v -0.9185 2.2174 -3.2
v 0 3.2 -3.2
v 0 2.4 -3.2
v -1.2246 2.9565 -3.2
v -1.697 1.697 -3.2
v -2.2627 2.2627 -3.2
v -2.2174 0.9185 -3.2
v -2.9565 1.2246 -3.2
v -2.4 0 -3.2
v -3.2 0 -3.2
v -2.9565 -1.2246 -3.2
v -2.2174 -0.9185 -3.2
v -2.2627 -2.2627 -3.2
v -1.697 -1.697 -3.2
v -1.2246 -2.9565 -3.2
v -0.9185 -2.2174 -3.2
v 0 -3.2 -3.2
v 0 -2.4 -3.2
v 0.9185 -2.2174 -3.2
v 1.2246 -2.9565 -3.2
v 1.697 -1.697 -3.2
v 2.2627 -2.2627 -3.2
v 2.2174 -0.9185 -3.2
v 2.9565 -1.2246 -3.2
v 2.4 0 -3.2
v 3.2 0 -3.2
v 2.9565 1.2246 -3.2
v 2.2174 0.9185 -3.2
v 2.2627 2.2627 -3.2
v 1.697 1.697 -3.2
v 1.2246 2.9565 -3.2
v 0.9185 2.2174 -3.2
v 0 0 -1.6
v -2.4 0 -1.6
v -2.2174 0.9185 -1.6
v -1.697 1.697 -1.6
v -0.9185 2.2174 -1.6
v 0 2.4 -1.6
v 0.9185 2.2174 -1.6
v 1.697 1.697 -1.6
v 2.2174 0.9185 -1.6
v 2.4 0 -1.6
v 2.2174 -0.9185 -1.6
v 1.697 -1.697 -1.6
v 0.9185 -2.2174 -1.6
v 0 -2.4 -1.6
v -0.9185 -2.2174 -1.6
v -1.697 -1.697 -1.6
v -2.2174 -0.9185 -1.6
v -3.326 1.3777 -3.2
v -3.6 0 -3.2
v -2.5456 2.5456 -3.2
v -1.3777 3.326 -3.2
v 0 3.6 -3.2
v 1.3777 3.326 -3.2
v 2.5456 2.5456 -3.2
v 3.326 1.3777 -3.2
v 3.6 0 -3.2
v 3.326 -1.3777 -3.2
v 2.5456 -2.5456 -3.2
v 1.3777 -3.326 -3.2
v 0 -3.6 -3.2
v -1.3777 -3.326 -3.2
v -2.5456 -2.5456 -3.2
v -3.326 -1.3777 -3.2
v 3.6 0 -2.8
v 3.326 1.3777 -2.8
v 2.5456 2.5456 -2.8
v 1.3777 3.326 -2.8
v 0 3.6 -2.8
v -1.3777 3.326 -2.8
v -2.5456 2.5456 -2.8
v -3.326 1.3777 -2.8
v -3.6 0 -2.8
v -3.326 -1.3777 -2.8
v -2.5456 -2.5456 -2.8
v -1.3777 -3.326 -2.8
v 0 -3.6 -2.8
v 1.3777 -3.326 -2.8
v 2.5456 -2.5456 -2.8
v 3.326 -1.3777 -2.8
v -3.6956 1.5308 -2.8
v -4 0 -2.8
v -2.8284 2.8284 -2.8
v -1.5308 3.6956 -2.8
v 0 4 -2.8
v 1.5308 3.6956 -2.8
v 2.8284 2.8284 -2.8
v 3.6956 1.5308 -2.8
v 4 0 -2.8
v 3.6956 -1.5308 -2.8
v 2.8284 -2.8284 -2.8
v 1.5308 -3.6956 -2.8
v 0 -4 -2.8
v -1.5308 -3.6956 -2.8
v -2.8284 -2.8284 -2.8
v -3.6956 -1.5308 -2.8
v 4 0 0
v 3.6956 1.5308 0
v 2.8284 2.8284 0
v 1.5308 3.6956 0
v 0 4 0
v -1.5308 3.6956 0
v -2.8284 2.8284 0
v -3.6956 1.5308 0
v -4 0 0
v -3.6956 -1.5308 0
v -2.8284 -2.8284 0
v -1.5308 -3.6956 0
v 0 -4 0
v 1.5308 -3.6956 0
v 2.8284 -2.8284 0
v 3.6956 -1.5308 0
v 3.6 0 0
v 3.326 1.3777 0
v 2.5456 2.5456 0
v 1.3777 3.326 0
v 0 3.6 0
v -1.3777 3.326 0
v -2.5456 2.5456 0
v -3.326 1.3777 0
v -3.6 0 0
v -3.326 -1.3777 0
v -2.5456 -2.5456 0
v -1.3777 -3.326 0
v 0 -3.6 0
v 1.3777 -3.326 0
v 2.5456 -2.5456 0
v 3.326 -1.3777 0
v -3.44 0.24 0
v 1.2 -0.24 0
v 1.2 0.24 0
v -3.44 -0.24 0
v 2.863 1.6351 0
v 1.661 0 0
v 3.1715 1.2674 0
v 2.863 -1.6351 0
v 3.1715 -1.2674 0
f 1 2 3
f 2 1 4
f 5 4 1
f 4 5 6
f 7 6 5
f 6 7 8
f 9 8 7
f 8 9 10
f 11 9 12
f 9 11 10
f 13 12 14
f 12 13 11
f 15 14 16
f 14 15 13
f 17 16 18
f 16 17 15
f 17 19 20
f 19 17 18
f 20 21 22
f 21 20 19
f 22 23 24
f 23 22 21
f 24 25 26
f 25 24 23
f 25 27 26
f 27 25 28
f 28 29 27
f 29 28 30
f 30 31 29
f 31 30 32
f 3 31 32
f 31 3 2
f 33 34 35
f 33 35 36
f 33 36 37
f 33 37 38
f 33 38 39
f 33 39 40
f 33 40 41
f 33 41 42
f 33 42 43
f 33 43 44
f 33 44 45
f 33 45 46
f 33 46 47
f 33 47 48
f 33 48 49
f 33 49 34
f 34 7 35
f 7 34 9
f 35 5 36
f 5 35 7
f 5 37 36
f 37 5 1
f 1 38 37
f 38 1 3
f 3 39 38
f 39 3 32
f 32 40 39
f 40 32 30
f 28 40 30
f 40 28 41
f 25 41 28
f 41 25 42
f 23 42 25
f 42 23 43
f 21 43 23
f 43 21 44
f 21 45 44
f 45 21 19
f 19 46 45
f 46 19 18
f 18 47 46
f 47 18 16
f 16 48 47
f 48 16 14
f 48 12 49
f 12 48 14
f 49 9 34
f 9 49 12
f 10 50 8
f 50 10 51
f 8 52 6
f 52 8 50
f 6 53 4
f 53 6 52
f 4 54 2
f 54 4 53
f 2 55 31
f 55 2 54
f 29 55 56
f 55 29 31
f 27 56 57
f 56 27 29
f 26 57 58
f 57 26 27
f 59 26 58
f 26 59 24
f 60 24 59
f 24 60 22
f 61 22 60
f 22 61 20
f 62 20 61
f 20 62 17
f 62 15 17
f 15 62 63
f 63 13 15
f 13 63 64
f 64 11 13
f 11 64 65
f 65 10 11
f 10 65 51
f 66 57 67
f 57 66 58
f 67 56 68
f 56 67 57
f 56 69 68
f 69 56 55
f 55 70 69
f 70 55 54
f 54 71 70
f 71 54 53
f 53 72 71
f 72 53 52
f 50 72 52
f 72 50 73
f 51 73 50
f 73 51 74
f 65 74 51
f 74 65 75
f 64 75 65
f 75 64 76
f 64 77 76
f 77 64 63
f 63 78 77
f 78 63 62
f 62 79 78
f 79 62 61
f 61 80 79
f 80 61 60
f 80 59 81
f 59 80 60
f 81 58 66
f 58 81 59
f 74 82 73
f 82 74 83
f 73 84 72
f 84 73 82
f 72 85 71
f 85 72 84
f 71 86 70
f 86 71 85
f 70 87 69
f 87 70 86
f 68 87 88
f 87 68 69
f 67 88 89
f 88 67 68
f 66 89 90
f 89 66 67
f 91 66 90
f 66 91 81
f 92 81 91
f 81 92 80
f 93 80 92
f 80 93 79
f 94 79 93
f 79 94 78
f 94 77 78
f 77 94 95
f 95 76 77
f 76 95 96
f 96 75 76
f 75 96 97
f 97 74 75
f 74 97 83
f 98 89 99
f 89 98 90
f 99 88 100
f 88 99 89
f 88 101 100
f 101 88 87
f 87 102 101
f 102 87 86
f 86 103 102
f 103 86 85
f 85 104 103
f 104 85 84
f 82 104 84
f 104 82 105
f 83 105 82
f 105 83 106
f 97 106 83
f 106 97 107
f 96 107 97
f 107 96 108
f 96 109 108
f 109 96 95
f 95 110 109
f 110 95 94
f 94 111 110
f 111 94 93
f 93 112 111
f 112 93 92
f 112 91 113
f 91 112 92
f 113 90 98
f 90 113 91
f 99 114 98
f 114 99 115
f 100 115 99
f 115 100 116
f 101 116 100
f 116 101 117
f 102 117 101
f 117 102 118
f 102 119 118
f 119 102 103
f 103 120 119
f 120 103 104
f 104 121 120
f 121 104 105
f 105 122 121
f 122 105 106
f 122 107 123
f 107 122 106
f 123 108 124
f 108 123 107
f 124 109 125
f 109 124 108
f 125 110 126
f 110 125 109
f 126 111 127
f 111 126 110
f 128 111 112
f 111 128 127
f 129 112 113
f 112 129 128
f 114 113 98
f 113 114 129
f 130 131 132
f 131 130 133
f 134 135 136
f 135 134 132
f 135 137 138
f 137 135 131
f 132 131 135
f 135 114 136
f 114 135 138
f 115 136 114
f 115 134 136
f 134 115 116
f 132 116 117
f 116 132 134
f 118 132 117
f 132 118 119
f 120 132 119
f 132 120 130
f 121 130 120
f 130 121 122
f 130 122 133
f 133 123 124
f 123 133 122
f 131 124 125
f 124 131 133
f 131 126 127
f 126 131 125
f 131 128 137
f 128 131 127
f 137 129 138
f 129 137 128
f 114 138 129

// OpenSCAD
// file: ../p/4-4disc.scad
use <../lib.scad>
function ldraw_lib__4_4disc() = [
// 0 Disc 1.0
// 0 Name: 4-4disc.dat
// 0 Author: James Jessiman
// 0 !LDRAW_ORG Primitive UPDATE 2002-02
// 0 !LICENSE Licensed under CC BY 2.0 and CC BY 4.0 : see CAreadme.txt
// 
// 0 BFC CERTIFY CCW
  [0,"BFC","CERTIFY"],
  [0,"BFC","CCW"],
// 
// 0 !HISTORY 1998-12-15 [PTadmin] Official Update 1998-10
// 0 !HISTORY 2002-03-23 [sbliss] Added BFC statement
// 0 !HISTORY 2002-04-25 [PTadmin] Official Update 2002-02
// 0 !HISTORY 2007-06-24 [PTadmin] Header formatted for Contributor Agreement
// 0 !HISTORY 2008-07-01 [PTadmin] Official Update 2008-01
// 
// 
// 3 16 0 0 0 1 0 0 0.9239 0 0.3827
  [3,16,0,0,0,1,0,0,0.9239,0,0.3827],
// 3 16 0 0 0 0.9239 0 0.3827 0.7071 0 0.7071
  [3,16,0,0,0,0.9239,0,0.3827,0.7071,0,0.7071],
// 3 16 0 0 0 0.7071 0 0.7071 0.3827 0 0.9239
  [3,16,0,0,0,0.7071,0,0.7071,0.3827,0,0.9239],
// 3 16 0 0 0 0.3827 0 0.9239 0 0 1
  [3,16,0,0,0,0.3827,0,0.9239,0,0,1],
// 3 16 0 0 0 0 0 1 -0.3827 0 0.9239
  [3,16,0,0,0,0,0,1,-0.3827,0,0.9239],
// 3 16 0 0 0 -0.3827 0 0.9239 -0.7071 0 0.7071
  [3,16,0,0,0,-0.3827,0,0.9239,-0.7071,0,0.7071],
// 3 16 0 0 0 -0.7071 0 0.7071 -0.9239 0 0.3827
  [3,16,0,0,0,-0.7071,0,0.7071,-0.9239,0,0.3827],
// 3 16 0 0 0 -0.9239 0 0.3827 -1 0 -0
  [3,16,0,0,0,-0.9239,0,0.3827,-1,0,-0],
// 3 16 0 0 0 -1 0 -0 -0.9239 0 -0.3827
  [3,16,0,0,0,-1,0,-0,-0.9239,0,-0.3827],
// 3 16 0 0 0 -0.9239 0 -0.3827 -0.7071 0 -0.7071
  [3,16,0,0,0,-0.9239,0,-0.3827,-0.7071,0,-0.7071],
// 3 16 0 0 0 -0.7071 0 -0.7071 -0.3827 0 -0.9239
  [3,16,0,0,0,-0.7071,0,-0.7071,-0.3827,0,-0.9239],
// 3 16 0 0 0 -0.3827 0 -0.9239 0 0 -1
  [3,16,0,0,0,-0.3827,0,-0.9239,0,0,-1],
// 3 16 0 0 0 0 0 -1 0.3827 0 -0.9239
  [3,16,0,0,0,0,0,-1,0.3827,0,-0.9239],
// 3 16 0 0 0 0.3827 0 -0.9239 0.7071 0 -0.7071
  [3,16,0,0,0,0.3827,0,-0.9239,0.7071,0,-0.7071],
// 3 16 0 0 0 0.7071 0 -0.7071 0.9239 0 -0.3827
  [3,16,0,0,0,0.7071,0,-0.7071,0.9239,0,-0.3827],
// 3 16 0 0 0 0.9239 0 -0.3827 1 0 0
  [3,16,0,0,0,0.9239,0,-0.3827,1,0,0],
// 0
];
makepoly(ldraw_lib__4_4disc(), line=0.2);
// file: ../p/4-4ring3.scad
use <../lib.scad>
function ldraw_lib__4_4ring3() = [
// 0 Ring  3 x 1.0
// 0 Name: 4-4ring3.dat
// 0 Author: James Jessiman
// 0 !LDRAW_ORG Primitive UPDATE 2009-01
// 0 !LICENSE Licensed under CC BY 2.0 and CC BY 4.0 : see CAreadme.txt
// 
// 0 BFC CERTIFY CCW
  [0,"BFC","CERTIFY"],
  [0,"BFC","CCW"],
// 
// 0 !HISTORY 1998-12-15 [PTadmin] Official Update 1998-10
// 0 !HISTORY 2002-04-05 [hafhead] Added BFC statement
// 0 !HISTORY 2002-04-25 [PTadmin] Official Update 2002-02
// 0 !HISTORY 2007-06-24 [PTadmin] Header formatted for Contributor Agreement
// 0 !HISTORY 2008-07-01 [PTadmin] Official Update 2008-01
// 0 !HISTORY 2008-08-26 [cwdee] Switch polygon winding and rename
// 0 !HISTORY 2009-05-02 [PTadmin] Official Update 2009-01
// 
// 
// 4 16 -1.5308 0 3.6956 -1.1481 0 2.7717 0 0 3 0 0 4
  [4,16,-1.5308,0,3.6956,-1.1481,0,2.7717,0,0,3,0,0,4],
// 4 16 -2.8284 0 2.8284 -2.1213 0 2.1213 -1.1481 0 2.7717 -1.5308 0 3.6956
  [4,16,-2.8284,0,2.8284,-2.1213,0,2.1213,-1.1481,0,2.7717,-1.5308,0,3.6956],
// 4 16 -3.6956 0 1.5308 -2.7717 0 1.1481 -2.1213 0 2.1213 -2.8284 0 2.8284
  [4,16,-3.6956,0,1.5308,-2.7717,0,1.1481,-2.1213,0,2.1213,-2.8284,0,2.8284],
// 4 16 -4 0 0 -3 0 0 -2.7717 0 1.1481 -3.6956 0 1.5308
  [4,16,-4,0,0,-3,0,0,-2.7717,0,1.1481,-3.6956,0,1.5308],
// 4 16 -3.6956 0 -1.5308 -2.7717 0 -1.1481 -3 0 0 -4 0 0
  [4,16,-3.6956,0,-1.5308,-2.7717,0,-1.1481,-3,0,0,-4,0,0],
// 4 16 -2.8284 0 -2.8284 -2.1213 0 -2.1213 -2.7717 0 -1.1481 -3.6956 0 -1.5308
  [4,16,-2.8284,0,-2.8284,-2.1213,0,-2.1213,-2.7717,0,-1.1481,-3.6956,0,-1.5308],
// 4 16 -1.5308 0 -3.6956 -1.1481 0 -2.7717 -2.1213 0 -2.1213 -2.8284 0 -2.8284
  [4,16,-1.5308,0,-3.6956,-1.1481,0,-2.7717,-2.1213,0,-2.1213,-2.8284,0,-2.8284],
// 4 16 0 0 -4 0 0 -3 -1.1481 0 -2.7717 -1.5308 0 -3.6956
  [4,16,0,0,-4,0,0,-3,-1.1481,0,-2.7717,-1.5308,0,-3.6956],
// 4 16 1.5308 0 -3.6956 1.1481 0 -2.7717 0 0 -3 0 0 -4
  [4,16,1.5308,0,-3.6956,1.1481,0,-2.7717,0,0,-3,0,0,-4],
// 4 16 2.8284 0 -2.8284 2.1213 0 -2.1213 1.1481 0 -2.7717 1.5308 0 -3.6956
  [4,16,2.8284,0,-2.8284,2.1213,0,-2.1213,1.1481,0,-2.7717,1.5308,0,-3.6956],
// 4 16 3.6956 0 -1.5308 2.7717 0 -1.1481 2.1213 0 -2.1213 2.8284 0 -2.8284
  [4,16,3.6956,0,-1.5308,2.7717,0,-1.1481,2.1213,0,-2.1213,2.8284,0,-2.8284],
// 4 16 4 0 0 3 0 0 2.7717 0 -1.1481 3.6956 0 -1.5308
  [4,16,4,0,0,3,0,0,2.7717,0,-1.1481,3.6956,0,-1.5308],
// 4 16 3.6956 0 1.5308 2.7717 0 1.1481 3 0 0 4 0 0
  [4,16,3.6956,0,1.5308,2.7717,0,1.1481,3,0,0,4,0,0],
// 4 16 2.8284 0 2.8284 2.1213 0 2.1213 2.7717 0 1.1481 3.6956 0 1.5308
  [4,16,2.8284,0,2.8284,2.1213,0,2.1213,2.7717,0,1.1481,3.6956,0,1.5308],
// 4 16 1.5308 0 3.6956 1.1481 0 2.7717 2.1213 0 2.1213 2.8284 0 2.8284
  [4,16,1.5308,0,3.6956,1.1481,0,2.7717,2.1213,0,2.1213,2.8284,0,2.8284],
// 4 16 0 0 4 0 0 3 1.1481 0 2.7717 1.5308 0 3.6956
  [4,16,0,0,4,0,0,3,1.1481,0,2.7717,1.5308,0,3.6956],
// 0
];
makepoly(ldraw_lib__4_4ring3(), line=0.2);
// file: ../p/4-4cylc.scad
use <../lib.scad>
use <4-4cyli.scad>
use <4-4disc.scad>
use <4-4edge.scad>
function ldraw_lib__4_4cylc() = [
// 0 Cylinder Closed 1.0
// 0 Name: 4-4cylc.dat
// 0 Author: Alex Taylor [anathema]
// 0 !LDRAW_ORG Primitive UPDATE 2009-02
// 0 !LICENSE Licensed under CC BY 2.0 and CC BY 4.0 : see CAreadme.txt
// 
// 0 BFC CERTIFY CCW
  [0,"BFC","CERTIFY"],
  [0,"BFC","CCW"],
// 
// 0 !HISTORY 2008-12-29 [cwdee] Removed one disc
// 0 !HISTORY 2009-09-03 [PTadmin] Official Update 2009-02
// 
// 
// 1 16 0 0 0 1 0 0 0 1 0 0 0 1 4-4edge.dat
  [1,16,0,0,0,1,0,0,0,1,0,0,0,1, ldraw_lib__4_4edge()],
// 1 16 0 1 0 1 0 0 0 1 0 0 0 1 4-4edge.dat
  [1,16,0,1,0,1,0,0,0,1,0,0,0,1, ldraw_lib__4_4edge()],
// 1 16 0 0 0 1 0 0 0 1 0 0 0 1 4-4disc.dat
  [1,16,0,0,0,1,0,0,0,1,0,0,0,1, ldraw_lib__4_4disc()],
// 1 16 0 0 0 1 0 0 0 1 0 0 0 1 4-4cyli.dat
  [1,16,0,0,0,1,0,0,0,1,0,0,0,1, ldraw_lib__4_4cyli()],
// 0
];
makepoly(ldraw_lib__4_4cylc(), line=0.2);
// file: ../p/4-4edge.scad
use <../lib.scad>
function ldraw_lib__4_4edge() = [
// 0 Circle 1.0
// 0 Name: 4-4edge.dat
// 0 Author: James Jessiman
// 0 !LDRAW_ORG Primitive UPDATE 2017-01
// 0 !LICENSE Licensed under CC BY 2.0 and CC BY 4.0 : see CAreadme.txt
// 
// 0 BFC CERTIFY CCW
  [0,"BFC","CERTIFY"],
  [0,"BFC","CCW"],
// 
// 0 !HISTORY 1998-12-15 [PTadmin] Official Update 1998-10
// 0 !HISTORY 2005-12-28 [PTadmin] Official Update 2005-01
// 0 !HISTORY 2007-06-24 [PTadmin] Header formatted for Contributor Agreement
// 0 !HISTORY 2008-07-01 [PTadmin] Official Update 2008-01
// 0 !HISTORY 2017-01-15 [Steffen] BFCed
// 0 !HISTORY 2017-12-30 [PTadmin] Official Update 2017-01
// 
// 
// 2 24 1 0 0 0.9239 0 0.3827
  [2,24,1,0,0,0.9239,0,0.3827],
// 2 24 0.9239 0 0.3827 0.7071 0 0.7071
  [2,24,0.9239,0,0.3827,0.7071,0,0.7071],
// 2 24 0.7071 0 0.7071 0.3827 0 0.9239
  [2,24,0.7071,0,0.7071,0.3827,0,0.9239],
// 2 24 0.3827 0 0.9239 0 0 1
  [2,24,0.3827,0,0.9239,0,0,1],
// 2 24 0 0 1 -0.3827 0 0.9239
  [2,24,0,0,1,-0.3827,0,0.9239],
// 2 24 -0.3827 0 0.9239 -0.7071 0 0.7071
  [2,24,-0.3827,0,0.9239,-0.7071,0,0.7071],
// 2 24 -0.7071 0 0.7071 -0.9239 0 0.3827
  [2,24,-0.7071,0,0.7071,-0.9239,0,0.3827],
// 2 24 -0.9239 0 0.3827 -1 0 -0
  [2,24,-0.9239,0,0.3827,-1,0,-0],
// 2 24 -1 0 -0 -0.9239 0 -0.3827
  [2,24,-1,0,-0,-0.9239,0,-0.3827],
// 2 24 -0.9239 0 -0.3827 -0.7071 0 -0.7071
  [2,24,-0.9239,0,-0.3827,-0.7071,0,-0.7071],
// 2 24 -0.7071 0 -0.7071 -0.3827 0 -0.9239
  [2,24,-0.7071,0,-0.7071,-0.3827,0,-0.9239],
// 2 24 -0.3827 0 -0.9239 0 0 -1
  [2,24,-0.3827,0,-0.9239,0,0,-1],
// 2 24 0 0 -1 0.3827 0 -0.9239
  [2,24,0,0,-1,0.3827,0,-0.9239],
// 2 24 0.3827 0 -0.9239 0.7071 0 -0.7071
  [2,24,0.3827,0,-0.9239,0.7071,0,-0.7071],
// 2 24 0.7071 0 -0.7071 0.9239 0 -0.3827
  [2,24,0.7071,0,-0.7071,0.9239,0,-0.3827],
// 2 24 0.9239 0 -0.3827 1 0 0
  [2,24,0.9239,0,-0.3827,1,0,0],
];
makepoly(ldraw_lib__4_4edge(), line=0.2);
// file: ../p/4-4cyli.scad
use <../lib.scad>
function ldraw_lib__4_4cyli() = [
// 0 Cylinder 1.0
// 0 Name: 4-4cyli.dat
// 0 Author: James Jessiman
// 0 !LDRAW_ORG Primitive UPDATE 2005-01
// 0 !LICENSE Licensed under CC BY 2.0 and CC BY 4.0 : see CAreadme.txt
// 
// 0 BFC CERTIFY CCW
  [0,"BFC","CERTIFY"],
  [0,"BFC","CCW"],
// 
// 0 !HISTORY 1998-12-15 [PTadmin] Official Update 1998-10
// 0 !HISTORY 2002-03-23 [sbliss] Added BFC statement; merged headers from files in distributions LDraw 0.27 and Complete.
// 0 !HISTORY 2002-04-25 [PTadmin] Official Update 2002-02
// 0 !HISTORY 2004-12-14 [guyvivan] BFC CCW
// 0 !HISTORY 2005-12-28 [PTadmin] Official Update 2005-01
// 0 !HISTORY 2007-06-24 [PTadmin] Header formatted for Contributor Agreement
// 0 !HISTORY 2008-07-01 [PTadmin] Official Update 2008-01
// 
// 
// 4 16 1 1 0 0.9239 1 0.3827 0.9239 0 0.3827 1 0 0
  [4,16,1,1,0,0.9239,1,0.3827,0.9239,0,0.3827,1,0,0],
// 5 24 1 0 0 1 1 0 0.9239 0 0.3827 0.9239 0 -0.3827
  [5,24,1,0,0,1,1,0,0.9239,0,0.3827,0.9239,0,-0.3827],
// 4 16 0.9239 1 0.3827 0.7071 1 0.7071 0.7071 0 0.7071 0.9239 0 0.3827
  [4,16,0.9239,1,0.3827,0.7071,1,0.7071,0.7071,0,0.7071,0.9239,0,0.3827],
// 5 24 0.9239 0 0.3827 0.9239 1 0.3827 0.7071 0 0.7071 1 0 0
  [5,24,0.9239,0,0.3827,0.9239,1,0.3827,0.7071,0,0.7071,1,0,0],
// 4 16 0.7071 1 0.7071 0.3827 1 0.9239 0.3827 0 0.9239 0.7071 0 0.7071
  [4,16,0.7071,1,0.7071,0.3827,1,0.9239,0.3827,0,0.9239,0.7071,0,0.7071],
// 5 24 0.7071 0 0.7071 0.7071 1 0.7071 0.3827 0 0.9239 0.9239 0 0.3827
  [5,24,0.7071,0,0.7071,0.7071,1,0.7071,0.3827,0,0.9239,0.9239,0,0.3827],
// 4 16 0.3827 1 0.9239 0 1 1 0 0 1 0.3827 0 0.9239
  [4,16,0.3827,1,0.9239,0,1,1,0,0,1,0.3827,0,0.9239],
// 5 24 0.3827 0 0.9239 0.3827 1 0.9239 0 0 1 0.7071 0 0.7071
  [5,24,0.3827,0,0.9239,0.3827,1,0.9239,0,0,1,0.7071,0,0.7071],
// 4 16 0 1 1 -0.3827 1 0.9239 -0.3827 0 0.9239 0 0 1
  [4,16,0,1,1,-0.3827,1,0.9239,-0.3827,0,0.9239,0,0,1],
// 5 24 0 0 1 0 1 1 -0.3827 0 0.9239 0.3827 0 0.9239
  [5,24,0,0,1,0,1,1,-0.3827,0,0.9239,0.3827,0,0.9239],
// 4 16 -0.3827 1 0.9239 -0.7071 1 0.7071 -0.7071 0 0.7071 -0.3827 0 0.9239
  [4,16,-0.3827,1,0.9239,-0.7071,1,0.7071,-0.7071,0,0.7071,-0.3827,0,0.9239],
// 5 24 -0.3827 0 0.9239 -0.3827 1 0.9239 -0.7071 0 0.7071 0 0 1
  [5,24,-0.3827,0,0.9239,-0.3827,1,0.9239,-0.7071,0,0.7071,0,0,1],
// 4 16 -0.7071 1 0.7071 -0.9239 1 0.3827 -0.9239 0 0.3827 -0.7071 0 0.7071
  [4,16,-0.7071,1,0.7071,-0.9239,1,0.3827,-0.9239,0,0.3827,-0.7071,0,0.7071],
// 5 24 -0.7071 0 0.7071 -0.7071 1 0.7071 -0.9239 0 0.3827 -0.3827 0 0.9239
  [5,24,-0.7071,0,0.7071,-0.7071,1,0.7071,-0.9239,0,0.3827,-0.3827,0,0.9239],
// 4 16 -0.9239 1 0.3827 -1 1 0 -1 0 0 -0.9239 0 0.3827
  [4,16,-0.9239,1,0.3827,-1,1,0,-1,0,0,-0.9239,0,0.3827],
// 5 24 -0.9239 0 0.3827 -0.9239 1 0.3827 -1 0 0 -0.7071 0 0.7071
  [5,24,-0.9239,0,0.3827,-0.9239,1,0.3827,-1,0,0,-0.7071,0,0.7071],
// 4 16 -1 1 0 -0.9239 1 -0.3827 -0.9239 0 -0.3827 -1 0 0
  [4,16,-1,1,0,-0.9239,1,-0.3827,-0.9239,0,-0.3827,-1,0,0],
// 5 24 -1 0 0 -1 1 0 -0.9239 0 -0.3827 -0.9239 0 0.3827
  [5,24,-1,0,0,-1,1,0,-0.9239,0,-0.3827,-0.9239,0,0.3827],
// 4 16 -0.9239 1 -0.3827 -0.7071 1 -0.7071 -0.7071 0 -0.7071 -0.9239 0 -0.3827
  [4,16,-0.9239,1,-0.3827,-0.7071,1,-0.7071,-0.7071,0,-0.7071,-0.9239,0,-0.3827],
// 5 24 -0.9239 0 -0.3827 -0.9239 1 -0.3827 -0.7071 0 -0.7071 -1 0 0
  [5,24,-0.9239,0,-0.3827,-0.9239,1,-0.3827,-0.7071,0,-0.7071,-1,0,0],
// 4 16 -0.7071 1 -0.7071 -0.3827 1 -0.9239 -0.3827 0 -0.9239 -0.7071 0 -0.7071
  [4,16,-0.7071,1,-0.7071,-0.3827,1,-0.9239,-0.3827,0,-0.9239,-0.7071,0,-0.7071],
// 5 24 -0.7071 0 -0.7071 -0.7071 1 -0.7071 -0.3827 0 -0.9239 -0.9239 0 -0.3827
  [5,24,-0.7071,0,-0.7071,-0.7071,1,-0.7071,-0.3827,0,-0.9239,-0.9239,0,-0.3827],
// 4 16 -0.3827 1 -0.9239 0 1 -1 0 0 -1 -0.3827 0 -0.9239
  [4,16,-0.3827,1,-0.9239,0,1,-1,0,0,-1,-0.3827,0,-0.9239],
// 5 24 -0.3827 0 -0.9239 -0.3827 1 -0.9239 0 0 -1 -0.7071 0 -0.7071
  [5,24,-0.3827,0,-0.9239,-0.3827,1,-0.9239,0,0,-1,-0.7071,0,-0.7071],
// 4 16 0 1 -1 0.3827 1 -0.9239 0.3827 0 -0.9239 0 0 -1
  [4,16,0,1,-1,0.3827,1,-0.9239,0.3827,0,-0.9239,0,0,-1],
// 5 24 0 0 -1 0 1 -1 0.3827 0 -0.9239 -0.3827 0 -0.9239
  [5,24,0,0,-1,0,1,-1,0.3827,0,-0.9239,-0.3827,0,-0.9239],
// 4 16 0.3827 1 -0.9239 0.7071 1 -0.7071 0.7071 0 -0.7071 0.3827 0 -0.9239
  [4,16,0.3827,1,-0.9239,0.7071,1,-0.7071,0.7071,0,-0.7071,0.3827,0,-0.9239],
// 5 24 0.3827 0 -0.9239 0.3827 1 -0.9239 0.7071 0 -0.7071 0 0 -1
  [5,24,0.3827,0,-0.9239,0.3827,1,-0.9239,0.7071,0,-0.7071,0,0,-1],
// 4 16 0.7071 1 -0.7071 0.9239 1 -0.3827 0.9239 0 -0.3827 0.7071 0 -0.7071
  [4,16,0.7071,1,-0.7071,0.9239,1,-0.3827,0.9239,0,-0.3827,0.7071,0,-0.7071],
// 5 24 0.7071 0 -0.7071 0.7071 1 -0.7071 0.9239 0 -0.3827 0.3827 0 -0.9239
  [5,24,0.7071,0,-0.7071,0.7071,1,-0.7071,0.9239,0,-0.3827,0.3827,0,-0.9239],
// 4 16 0.9239 1 -0.3827 1 1 0 1 0 0 0.9239 0 -0.3827
  [4,16,0.9239,1,-0.3827,1,1,0,1,0,0,0.9239,0,-0.3827],
// 5 24 0.9239 0 -0.3827 0.9239 1 -0.3827 1 0 0 0.7071 0 -0.7071
  [5,24,0.9239,0,-0.3827,0.9239,1,-0.3827,1,0,0,0.7071,0,-0.7071],
// 0
];
makepoly(ldraw_lib__4_4cyli(), line=0.2);
// file: ../p/stud4o.scad
use <../lib.scad>
use <4-4cylc.scad>
use <4-4ring3.scad>
function ldraw_lib__stud4o() = [
// 0 Stud Tube Open without Outer Cylinder
// 0 Name: stud4o.dat
// 0 Author: Magnus Forsberg [MagFors]
// 0 !LDRAW_ORG Primitive UPDATE 2011-02
// 0 !LICENSE Licensed under CC BY 2.0 and CC BY 4.0 : see CAreadme.txt
// 
// 0 !HELP This stud is a "antistud" to be used like a underside stud,
// 0 !HELP but without the outer cylinder.
// 0 !HELP 1 47 0 0 0 1 0 0 0 1 0 0 0 1 stud4.dat
// 
// 0 BFC CERTIFY CCW
  [0,"BFC","CERTIFY"],
  [0,"BFC","CCW"],
// 
// 0 !HISTORY 2011-12-29 [PTadmin] Official Update 2011-02
// 
// 
// 1 16 0 -4 0 2 0 0 0 1 0 0 0 2 4-4ring3.dat
  [1,16,0,-4,0,2,0,0,0,1,0,0,0,2, ldraw_lib__4_4ring3()],
// 0 BFC INVERTNEXT
  [0,"BFC","INVERTNEXT"],
// 1 16 0 0 0 -6 0 0 0 -4 0 0 0 6 4-4cylc.dat
  [1,16,0,0,0,-6,0,0,0,-4,0,0,0,6, ldraw_lib__4_4cylc()],
];
makepoly(ldraw_lib__stud4o(), line=0.2);
// file: ../p/4-4ring8.scad
use <../lib.scad>
function ldraw_lib__4_4ring8() = [
// 0 Ring  8 x 1.0
// 0 Name: 4-4ring8.dat
// 0 Author: Steffen [Steffen]
// 0 !LDRAW_ORG Primitive UPDATE 2012-01
// 0 !LICENSE Licensed under CC BY 2.0 and CC BY 4.0 : see CAreadme.txt
// 
// 0 BFC CERTIFY CCW
  [0,"BFC","CERTIFY"],
  [0,"BFC","CCW"],
// 
// 0 !HISTORY 2003-12-19 [PTadmin] Official Update 2003-03
// 0 !HISTORY 2007-06-24 [PTadmin] Header formatted for Contributor Agreement
// 0 !HISTORY 2008-07-01 [PTadmin] Official Update 2008-01
// 0 !HISTORY 2012-02-16 [Philo] Changed to CCW
// 0 !HISTORY 2012-03-30 [PTadmin] Official Update 2012-01
// 
// 
// 4 16 9 0 0 8.3151 0 3.4443 7.3912 0 3.0616 8 0 0
  [4,16,9,0,0,8.3151,0,3.4443,7.3912,0,3.0616,8,0,0],
// 4 16 8.3151 0 3.4443 6.3639 0 6.3639 5.6568 0 5.6568 7.3912 0 3.0616
  [4,16,8.3151,0,3.4443,6.3639,0,6.3639,5.6568,0,5.6568,7.3912,0,3.0616],
// 4 16 6.3639 0 6.3639 3.4443 0 8.3151 3.0616 0 7.3912 5.6568 0 5.6568
  [4,16,6.3639,0,6.3639,3.4443,0,8.3151,3.0616,0,7.3912,5.6568,0,5.6568],
// 4 16 3.4443 0 8.3151 0 0 9 0 0 8 3.0616 0 7.3912
  [4,16,3.4443,0,8.3151,0,0,9,0,0,8,3.0616,0,7.3912],
// 4 16 0 0 9 -3.4443 0 8.3151 -3.0616 0 7.3912 0 0 8
  [4,16,0,0,9,-3.4443,0,8.3151,-3.0616,0,7.3912,0,0,8],
// 4 16 -3.4443 0 8.3151 -6.3639 0 6.3639 -5.6568 0 5.6568 -3.0616 0 7.3912
  [4,16,-3.4443,0,8.3151,-6.3639,0,6.3639,-5.6568,0,5.6568,-3.0616,0,7.3912],
// 4 16 -6.3639 0 6.3639 -8.3151 0 3.4443 -7.3912 0 3.0616 -5.6568 0 5.6568
  [4,16,-6.3639,0,6.3639,-8.3151,0,3.4443,-7.3912,0,3.0616,-5.6568,0,5.6568],
// 4 16 -8.3151 0 3.4443 -9 0 0 -8 0 0 -7.3912 0 3.0616
  [4,16,-8.3151,0,3.4443,-9,0,0,-8,0,0,-7.3912,0,3.0616],
// 4 16 -9 0 0 -8.3151 0 -3.4443 -7.3912 0 -3.0616 -8 0 0
  [4,16,-9,0,0,-8.3151,0,-3.4443,-7.3912,0,-3.0616,-8,0,0],
// 4 16 -8.3151 0 -3.4443 -6.3639 0 -6.3639 -5.6568 0 -5.6568 -7.3912 0 -3.0616
  [4,16,-8.3151,0,-3.4443,-6.3639,0,-6.3639,-5.6568,0,-5.6568,-7.3912,0,-3.0616],
// 4 16 -6.3639 0 -6.3639 -3.4443 0 -8.3151 -3.0616 0 -7.3912 -5.6568 0 -5.6568
  [4,16,-6.3639,0,-6.3639,-3.4443,0,-8.3151,-3.0616,0,-7.3912,-5.6568,0,-5.6568],
// 4 16 -3.4443 0 -8.3151 0 0 -9 0 0 -8 -3.0616 0 -7.3912
  [4,16,-3.4443,0,-8.3151,0,0,-9,0,0,-8,-3.0616,0,-7.3912],
// 4 16 0 0 -9 3.4443 0 -8.3151 3.0616 0 -7.3912 0 0 -8
  [4,16,0,0,-9,3.4443,0,-8.3151,3.0616,0,-7.3912,0,0,-8],
// 4 16 3.4443 0 -8.3151 6.3639 0 -6.3639 5.6568 0 -5.6568 3.0616 0 -7.3912
  [4,16,3.4443,0,-8.3151,6.3639,0,-6.3639,5.6568,0,-5.6568,3.0616,0,-7.3912],
// 4 16 6.3639 0 -6.3639 8.3151 0 -3.4443 7.3912 0 -3.0616 5.6568 0 -5.6568
  [4,16,6.3639,0,-6.3639,8.3151,0,-3.4443,7.3912,0,-3.0616,5.6568,0,-5.6568],
// 4 16 8.3151 0 -3.4443 9 0 0 8 0 0 7.3912 0 -3.0616
  [4,16,8.3151,0,-3.4443,9,0,0,8,0,0,7.3912,0,-3.0616],
];
makepoly(ldraw_lib__4_4ring8(), line=0.2);
// file: ../p/4-4cylo.scad
use <../lib.scad>
use <4-4cyli.scad>
use <4-4edge.scad>
function ldraw_lib__4_4cylo() = [
// 0 Cylinder Open 1.0
// 0 Name: 4-4cylo.dat
// 0 Author: Mark Kennedy [mkennedy]
// 0 !LDRAW_ORG Primitive UPDATE 2010-01
// 0 !LICENSE Licensed under CC BY 2.0 and CC BY 4.0 : see CAreadme.txt
// 
// 0 BFC CERTIFY CCW
  [0,"BFC","CERTIFY"],
  [0,"BFC","CCW"],
// 
// 0 !HISTORY 2010-04-05 [PTadmin] Official Update 2010-01
// 
// 
// 1 16 0 0 0 1 0 0 0 1 0 0 0 1 4-4edge.dat
  [1,16,0,0,0,1,0,0,0,1,0,0,0,1, ldraw_lib__4_4edge()],
// 1 16 0 1 0 1 0 0 0 1 0 0 0 1 4-4edge.dat
  [1,16,0,1,0,1,0,0,0,1,0,0,0,1, ldraw_lib__4_4edge()],
// 1 16 0 0 0 1 0 0 0 1 0 0 0 1 4-4cyli.dat
  [1,16,0,0,0,1,0,0,0,1,0,0,0,1, ldraw_lib__4_4cyli()],
// 0
];
makepoly(ldraw_lib__4_4cylo(), line=0.2);
// file: ../p/empty.scad
use <../lib.scad>
function ldraw_lib__empty() = [
// 0 Empty
// 0 Name: empty.dat
// 0 Author: Steffen [Steffen]
// 0 !LDRAW_ORG Primitive UPDATE 2015-01
// 0 !LICENSE Licensed under CC BY 2.0 and CC BY 4.0 : see CAreadme.txt
// 
// 0 BFC CERTIFY CCW
  [0,"BFC","CERTIFY"],
  [0,"BFC","CCW"],
// 
// 0 !HISTORY 2015-10-11 [PTadmin] Official Update 2015-01
// 
// 
// 0 // Tool MLCad cannot handle really empty files. This file is used as a workaround.
// 0 // It exceptionally contains forbidden non-LDRAW standard syntax to satisfy MLCad until it is fixed OR a different editor has become the de-facto LDRAW standard.
// 0 // The line being used here is an "impossible" conditional line which never should be visible,
// 0 // additionally hidden by a syntax explicitly hiding it from displaying.
// 
// 0 MLCAD HIDE 5 24 0 0 0 0.0001 0 0 0.0001 -0.0001 0 0 0 0
];
makepoly(ldraw_lib__empty(), line=0.2);
// file: s/98138s02.scad
use <../../lib.scad>
use <../../p/4-4cylo.scad>
use <../../p/4-4ring8.scad>
use <../../p/4-4ring9.scad>
use <../../p/stud4o.scad>
function ldraw_lib__s__98138s02() = [
// 0 ~Tile  1 x  1 Round with Groove without Complete Top Face
// 0 Name: s\98138s02.dat
// 0 Author: Magnus Forsberg [MagFors]
// 0 !LDRAW_ORG Subpart UPDATE 2020-01
// 0 !LICENSE Licensed under CC BY 2.0 and CC BY 4.0 : see CAreadme.txt
// 
// 0 BFC CERTIFY CCW
  [0,"BFC","CERTIFY"],
  [0,"BFC","CCW"],
// 
// 0 !HISTORY 2020-06-28 [PTadmin] Official Update 2020-01
// 
// 
// 1 16 0 4 0 1 0 0 0 -1 0 0 0 1 stud4o.dat
  [1,16,0,4,0,1,0,0,0,-1,0,0,0,1, ldraw_lib__stud4o()],
// 1 16 0 8 0 -1 0 0 0 -1 0 0 0 1 4-4ring8.dat
  [1,16,0,8,0,-1,0,0,0,-1,0,0,0,1, ldraw_lib__4_4ring8()],
// 1 16 0 7 0 9 0 0 0 1 0 0 0 9 4-4cylo.dat
  [1,16,0,7,0,9,0,0,0,1,0,0,0,9, ldraw_lib__4_4cylo()],
// 1 16 0 7 0 -1 0 0 0 -1 0 0 0 1 4-4ring9.dat
  [1,16,0,7,0,-1,0,0,0,-1,0,0,0,1, ldraw_lib__4_4ring9()],
// 1 16 0 0 0 10 0 0 0 7 0 0 0 10 4-4cylo.dat
  [1,16,0,0,0,10,0,0,0,7,0,0,0,10, ldraw_lib__4_4cylo()],
];
makepoly(ldraw_lib__s__98138s02(), line=0.2);
// file: ../p/4-4ring9.scad
use <../lib.scad>
function ldraw_lib__4_4ring9() = [
// 0 Ring  9 x 1.0
// 0 Name: 4-4ring9.dat
// 0 Author: John Riley [jriley]
// 0 !LDRAW_ORG Primitive UPDATE 2004-02
// 0 !LICENSE Licensed under CC BY 2.0 and CC BY 4.0 : see CAreadme.txt
// 
// 0 BFC CERTIFY CCW
  [0,"BFC","CERTIFY"],
  [0,"BFC","CCW"],
// 
// 0 !HISTORY 2004-04-22 [PTadmin] Official Update 2004-02
// 0 !HISTORY 2007-06-24 [PTadmin] Header formatted for Contributor Agreement
// 0 !HISTORY 2008-07-01 [PTadmin] Official Update 2008-01
// 
// 
// 4 16 9 0 0 10 0 0 9.239 0 3.827 8.3151 0 3.4443
  [4,16,9,0,0,10,0,0,9.239,0,3.827,8.3151,0,3.4443],
// 4 16 8.3151 0 3.4443 9.239 0 3.827 7.071 0 7.071 6.3639 0 6.3639
  [4,16,8.3151,0,3.4443,9.239,0,3.827,7.071,0,7.071,6.3639,0,6.3639],
// 4 16 6.3639 0 6.3639 7.071 0 7.071 3.827 0 9.239 3.4443 0 8.3151
  [4,16,6.3639,0,6.3639,7.071,0,7.071,3.827,0,9.239,3.4443,0,8.3151],
// 4 16 3.4443 0 8.3151 3.827 0 9.239 0 0 10 0 0 9
  [4,16,3.4443,0,8.3151,3.827,0,9.239,0,0,10,0,0,9],
// 4 16 0 0 9 0 0 10 -3.827 0 9.239 -3.4443 0 8.3151
  [4,16,0,0,9,0,0,10,-3.827,0,9.239,-3.4443,0,8.3151],
// 4 16 -3.4443 0 8.3151 -3.827 0 9.239 -7.071 0 7.071 -6.3639 0 6.3639
  [4,16,-3.4443,0,8.3151,-3.827,0,9.239,-7.071,0,7.071,-6.3639,0,6.3639],
// 4 16 -6.3639 0 6.3639 -7.071 0 7.071 -9.239 0 3.827 -8.3151 0 3.4443
  [4,16,-6.3639,0,6.3639,-7.071,0,7.071,-9.239,0,3.827,-8.3151,0,3.4443],
// 4 16 -8.3151 0 3.4443 -9.239 0 3.827 -10 0 0 -9 0 0
  [4,16,-8.3151,0,3.4443,-9.239,0,3.827,-10,0,0,-9,0,0],
// 4 16 -9 0 0 -10 0 0 -9.239 0 -3.827 -8.3151 0 -3.4443
  [4,16,-9,0,0,-10,0,0,-9.239,0,-3.827,-8.3151,0,-3.4443],
// 4 16 -8.3151 0 -3.4443 -9.239 0 -3.827 -7.071 0 -7.071 -6.3639 0 -6.3639
  [4,16,-8.3151,0,-3.4443,-9.239,0,-3.827,-7.071,0,-7.071,-6.3639,0,-6.3639],
// 4 16 -6.3639 0 -6.3639 -7.071 0 -7.071 -3.827 0 -9.239 -3.4443 0 -8.3151
  [4,16,-6.3639,0,-6.3639,-7.071,0,-7.071,-3.827,0,-9.239,-3.4443,0,-8.3151],
// 4 16 -3.4443 0 -8.3151 -3.827 0 -9.239 0 0 -10 0 0 -9
  [4,16,-3.4443,0,-8.3151,-3.827,0,-9.239,0,0,-10,0,0,-9],
// 4 16 0 0 -9 0 0 -10 3.827 0 -9.239 3.4443 0 -8.3151
  [4,16,0,0,-9,0,0,-10,3.827,0,-9.239,3.4443,0,-8.3151],
// 4 16 3.4443 0 -8.3151 3.827 0 -9.239 7.071 0 -7.071 6.3639 0 -6.3639
  [4,16,3.4443,0,-8.3151,3.827,0,-9.239,7.071,0,-7.071,6.3639,0,-6.3639],
// 4 16 6.3639 0 -6.3639 7.071 0 -7.071 9.239 0 -3.827 8.3151 0 -3.4443
  [4,16,6.3639,0,-6.3639,7.071,0,-7.071,9.239,0,-3.827,8.3151,0,-3.4443],
// 4 16 8.3151 0 -3.4443 9.239 0 -3.827 10 0 0 9 0 0
  [4,16,8.3151,0,-3.4443,9.239,0,-3.827,10,0,0,9,0,0],
// 0
];
makepoly(ldraw_lib__4_4ring9(), line=0.2);
// file: ../p/1-16chrd.scad
use <../lib.scad>
use <empty.scad>
function ldraw_lib__1_16chrd() = [
// 0 Chord 0.0625
// 0 Name: 1-16chrd.dat
// 0 Author: Philippe Hurbain [Philo]
// 0 !LDRAW_ORG Primitive UPDATE 2015-01
// 0 !LICENSE Licensed under CC BY 2.0 and CC BY 4.0 : see CAreadme.txt
// 
// 0 BFC CERTIFY CCW
  [0,"BFC","CERTIFY"],
  [0,"BFC","CCW"],
// 
// 0 !HISTORY 2015-10-11 [PTadmin] Official Update 2015-01
// 
// 
// 0 // This file is intentionally empty because at the current \P resolution,
// 0 // an 1-16chrd is actually empty. However, this file still is present
// 0 // to allow tools to do primitives substition and fill in a real chrd here,
// 0 // or, if desired, to substitute this with the hi-res 48\1-16chrd.
// 
// 0 // This file is based on an idea by Darats at http://forums.ldraw.org/read.php?19,14500,14500#msg-14500
// 
// 1 16 0 0 0 1 0 0 0 1 0 0 0 1 empty.dat
  [1,16,0,0,0,1,0,0,0,1,0,0,0,1, ldraw_lib__empty()],
];
makepoly(ldraw_lib__1_16chrd(), line=0.2);
// file: s/98138s01.scad
use <../../lib.scad>
use <../../p/4-4ring9.scad>
use <98138s02.scad>
function ldraw_lib__s__98138s01() = [
// 0 ~Tile  1 x  1 Round with Groove with Partial Top Face
// 0 Name: s\98138s01.dat
// 0 Author: Magnus Forsberg [MagFors]
// 0 !LDRAW_ORG Subpart UPDATE 2020-01
// 0 !LICENSE Licensed under CC BY 2.0 and CC BY 4.0 : see CAreadme.txt
// 
// 0 BFC CERTIFY CCW
  [0,"BFC","CERTIFY"],
  [0,"BFC","CCW"],
// 
// 0 !HISTORY 2011-12-29 [PTadmin] Official Update 2011-02
// 0 !HISTORY 2016-06-17 [MagFors] Reduced the rounded edge to 0.5 ldu
// 0 !HISTORY 2016-12-31 [PTadmin] Official Update 2016-01
// 0 !HISTORY 2019-06-17 [MagFors] Removed the rounded edge
// 0 !HISTORY 2019-07-19 [MagFors] Subfiled without top surface
// 0 !HISTORY 2020-06-28 [PTadmin] Official Update 2020-01
// 
// 
// 1 16 0 0 0 1 0 0 0 1 0 0 0 1 s\98138s02.dat
  [1,16,0,0,0,1,0,0,0,1,0,0,0,1, ldraw_lib__s__98138s02()],
// 1 16 0 0 0 1 0 0 0 1 0 0 0 1 4-4ring9.dat
  [1,16,0,0,0,1,0,0,0,1,0,0,0,1, ldraw_lib__4_4ring9()],
];
makepoly(ldraw_lib__s__98138s01(), line=0.2);
// file: ../p/4-4ering.scad
use <../lib.scad>
use <1-16chrd.scad>
function ldraw_lib__4_4ering() = [
// 0 Adapter Ring Triangles to Normal 1.0
// 0 Name: 4-4ering.dat
// 0 Author: Philippe Hurbain [Philo]
// 0 !LDRAW_ORG Primitive UPDATE 2015-01
// 0 !LICENSE Licensed under CC BY 2.0 and CC BY 4.0 : see CAreadme.txt
// 
// 0 BFC CERTIFY CCW
  [0,"BFC","CERTIFY"],
  [0,"BFC","CCW"],
// 
// 0 !HISTORY 2015-10-11 [PTadmin] Official Update 2015-01
// 
// 
// 0 // This file uses 1-16chrd (actually empty). It allows
// 0 // tools to do primitives substition and fill in a ring of chrd here,
// 0 // or, if desired, to substitute this with the hi-res 48\1-16chrd.
// 0 // This file is based on an idea by Darats at http://forums.ldraw.org/read.php?19,14500,14500#msg-14500
// 
// 1 16 0 0 0 1 0 0 0 1 0 0 0 1 1-16chrd.dat
  [1,16,0,0,0,1,0,0,0,1,0,0,0,1, ldraw_lib__1_16chrd()],
// 1 16 0 0 0 0.92388 0 0.38268 0 1 0 -0.38268 0 0.92388 1-16chrd.dat
  [1,16,0,0,0,0.92388,0,0.38268,0,1,0,-0.38268,0,0.92388, ldraw_lib__1_16chrd()],
// 1 16 0 0 0 0.70711 0 0.70711 0 1 0 -0.70711 0 0.70711 1-16chrd.dat
  [1,16,0,0,0,0.70711,0,0.70711,0,1,0,-0.70711,0,0.70711, ldraw_lib__1_16chrd()],
// 1 16 0 0 0 0.38268 0 0.92388 0 1 0 -0.92388 0 0.38268 1-16chrd.dat
  [1,16,0,0,0,0.38268,0,0.92388,0,1,0,-0.92388,0,0.38268, ldraw_lib__1_16chrd()],
// 1 16 0 0 0 0 0 1 0 1 0 -1 0 0 1-16chrd.dat
  [1,16,0,0,0,0,0,1,0,1,0,-1,0,0, ldraw_lib__1_16chrd()],
// 1 16 0 0 0 -0.38268 0 0.92388 0 1 0 -0.92388 0 -0.38268 1-16chrd.dat
  [1,16,0,0,0,-0.38268,0,0.92388,0,1,0,-0.92388,0,-0.38268, ldraw_lib__1_16chrd()],
// 1 16 0 0 0 -0.70711 0 0.70711 0 1 0 -0.70711 0 -0.70711 1-16chrd.dat
  [1,16,0,0,0,-0.70711,0,0.70711,0,1,0,-0.70711,0,-0.70711, ldraw_lib__1_16chrd()],
// 1 16 0 0 0 -0.92388 0 0.38268 0 1 0 -0.38268 0 -0.92388 1-16chrd.dat
  [1,16,0,0,0,-0.92388,0,0.38268,0,1,0,-0.38268,0,-0.92388, ldraw_lib__1_16chrd()],
// 1 16 0 0 0 0 0 -1 0 1 0 1 0 0 1-16chrd.dat
  [1,16,0,0,0,0,0,-1,0,1,0,1,0,0, ldraw_lib__1_16chrd()],
// 1 16 0 0 0 0.38268 0 -0.92388 0 1 0 0.92388 0 0.38268 1-16chrd.dat
  [1,16,0,0,0,0.38268,0,-0.92388,0,1,0,0.92388,0,0.38268, ldraw_lib__1_16chrd()],
// 1 16 0 0 0 0.70711 0 -0.70711 0 1 0 0.70711 0 0.70711 1-16chrd.dat
  [1,16,0,0,0,0.70711,0,-0.70711,0,1,0,0.70711,0,0.70711, ldraw_lib__1_16chrd()],
// 1 16 0 0 0 0.92388 0 -0.38268 0 1 0 0.38268 0 0.92388 1-16chrd.dat
  [1,16,0,0,0,0.92388,0,-0.38268,0,1,0,0.38268,0,0.92388, ldraw_lib__1_16chrd()],
// 1 16 0 0 0 -1 0 0 0 1 0 0 0 -1 1-16chrd.dat
  [1,16,0,0,0,-1,0,0,0,1,0,0,0,-1, ldraw_lib__1_16chrd()],
// 1 16 0 0 0 -0.92388 0 -0.38268 0 1 0 0.38268 0 -0.92388 1-16chrd.dat
  [1,16,0,0,0,-0.92388,0,-0.38268,0,1,0,0.38268,0,-0.92388, ldraw_lib__1_16chrd()],
// 1 16 0 0 0 -0.70711 0 -0.70711 0 1 0 0.70711 0 -0.70711 1-16chrd.dat
  [1,16,0,0,0,-0.70711,0,-0.70711,0,1,0,0.70711,0,-0.70711, ldraw_lib__1_16chrd()],
// 1 16 0 0 0 -0.38268 0 -0.92388 0 1 0 0.92388 0 -0.38268 1-16chrd.dat
  [1,16,0,0,0,-0.38268,0,-0.92388,0,1,0,0.92388,0,-0.38268, ldraw_lib__1_16chrd()],
];
makepoly(ldraw_lib__4_4ering(), line=0.2);
// main file
use <../lib.scad>
use <../p/4-4ering.scad>
use <s/98138s01.scad>
function ldraw_lib__98138ps5() = [
// 0 Tile  1 x  1 Round with Dark Bluish Grey Lines in Y-Shape Pattern
// 0 Name: 98138ps5.dat
// 0 Author: Gerald Lasser [GeraldLasser]
// 0 !LDRAW_ORG Part UPDATE 2017-01
// 0 !LICENSE Licensed under CC BY 2.0 and CC BY 4.0 : see CAreadme.txt
// 
// 0 BFC CERTIFY CCW
  [0,"BFC","CERTIFY"],
  [0,"BFC","CCW"],
// 
// 0 !KEYWORDS Brickheadz, Carbonite, Closed Eyes, Han Solo, NYCC, Set 41498
// 0 !KEYWORDS Star Wars
// 
// 0 !HISTORY 2017-12-30 [PTadmin] Official Update 2017-01
// 
// 
// 1 16 0 0 0 1 0 0 0 1 0 0 0 1 s\98138s01.dat
  [1,16,0,0,0,1,0,0,0,1,0,0,0,1, ldraw_lib__s__98138s01()],
// 1 16 0 0 0 9 0 0 0 1 0 0 0 9 4-4ering.dat
  [1,16,0,0,0,9,0,0,0,1,0,0,0,9, ldraw_lib__4_4ering()],
// 4 72 3 0 -.6 3 0 .6 -8.6 0 .6 -8.6 0 -.6
  [4,72,3,0,-.6,3,0,.6,-8.6,0,.6,-8.6,0,-.6],
// 4 72 7.9287 0 3.1685 7.1574 0 4.0878 3 0 .6 4.1526 0 0
  [4,72,7.9287,0,3.1685,7.1574,0,4.0878,3,0,.6,4.1526,0,0],
// 4 72 3 0 -.6 7.1574 0 -4.0878 7.9287 0 -3.1685 4.1526 0 0
  [4,72,3,0,-.6,7.1574,0,-4.0878,7.9287,0,-3.1685,4.1526,0,0],
// 3 72 3 0 .6 3 0 -.6 4.1526 0 0
  [3,72,3,0,.6,3,0,-.6,4.1526,0,0],
// 4 16 4.1526 0 0 7.9287 0 -3.1685 9 0 0 7.9287 0 3.1685
  [4,16,4.1526,0,0,7.9287,0,-3.1685,9,0,0,7.9287,0,3.1685],
// 3 16 8.3151 0 3.4443 7.9287 0 3.1685 9 0 0
  [3,16,8.3151,0,3.4443,7.9287,0,3.1685,9,0,0],
// 4 16 7.1574 0 4.0878 7.9287 0 3.1685 8.3151 0 3.4443 6.3639 0 6.3639
  [4,16,7.1574,0,4.0878,7.9287,0,3.1685,8.3151,0,3.4443,6.3639,0,6.3639],
// 4 16 3 0 .6 7.1574 0 4.0878 6.3639 0 6.3639 3.4443 0 8.3151
  [4,16,3,0,.6,7.1574,0,4.0878,6.3639,0,6.3639,3.4443,0,8.3151],
// 4 16 3 0 .6 3.4443 0 8.3151 0 0 9 -3.4443 0 8.3151
  [4,16,3,0,.6,3.4443,0,8.3151,0,0,9,-3.4443,0,8.3151],
// 4 16 3 0 .6 -3.4443 0 8.3151 -6.3639 0 6.3639 -8.6 0 .6
  [4,16,3,0,.6,-3.4443,0,8.3151,-6.3639,0,6.3639,-8.6,0,.6],
// 4 16 -8.6 0 .6 -6.3639 0 6.3639 -8.3151 0 3.4443 -9 0 0
  [4,16,-8.6,0,.6,-6.3639,0,6.3639,-8.3151,0,3.4443,-9,0,0],
// 3 16 -8.6 0 .6 -9 0 0 -8.6 0 -.6
  [3,16,-8.6,0,.6,-9,0,0,-8.6,0,-.6],
// 4 16 -8.6 0 -.6 -9 0 0 -8.3151 0 -3.4443 -6.3639 0 -6.3639
  [4,16,-8.6,0,-.6,-9,0,0,-8.3151,0,-3.4443,-6.3639,0,-6.3639],
// 4 16 3 0 -.6 -8.6 0 -.6 -6.3639 0 -6.3639 -3.4443 0 -8.3151
  [4,16,3,0,-.6,-8.6,0,-.6,-6.3639,0,-6.3639,-3.4443,0,-8.3151],
// 4 16 3 0 -.6 -3.4443 0 -8.3151 0 0 -9 3.4443 0 -8.3151
  [4,16,3,0,-.6,-3.4443,0,-8.3151,0,0,-9,3.4443,0,-8.3151],
// 4 16 3 0 -.6 3.4443 0 -8.3151 6.3639 0 -6.3639 7.1574 0 -4.0878
  [4,16,3,0,-.6,3.4443,0,-8.3151,6.3639,0,-6.3639,7.1574,0,-4.0878],
// 4 16 7.1574 0 -4.0878 6.3639 0 -6.3639 8.3151 0 -3.4443 7.9287 0 -3.1685
  [4,16,7.1574,0,-4.0878,6.3639,0,-6.3639,8.3151,0,-3.4443,7.9287,0,-3.1685],
// 3 16 9 0 0 7.9287 0 -3.1685 8.3151 0 -3.4443
  [3,16,9,0,0,7.9287,0,-3.1685,8.3151,0,-3.4443],
];
makepoly(ldraw_lib__98138ps5(), line=0.2);
